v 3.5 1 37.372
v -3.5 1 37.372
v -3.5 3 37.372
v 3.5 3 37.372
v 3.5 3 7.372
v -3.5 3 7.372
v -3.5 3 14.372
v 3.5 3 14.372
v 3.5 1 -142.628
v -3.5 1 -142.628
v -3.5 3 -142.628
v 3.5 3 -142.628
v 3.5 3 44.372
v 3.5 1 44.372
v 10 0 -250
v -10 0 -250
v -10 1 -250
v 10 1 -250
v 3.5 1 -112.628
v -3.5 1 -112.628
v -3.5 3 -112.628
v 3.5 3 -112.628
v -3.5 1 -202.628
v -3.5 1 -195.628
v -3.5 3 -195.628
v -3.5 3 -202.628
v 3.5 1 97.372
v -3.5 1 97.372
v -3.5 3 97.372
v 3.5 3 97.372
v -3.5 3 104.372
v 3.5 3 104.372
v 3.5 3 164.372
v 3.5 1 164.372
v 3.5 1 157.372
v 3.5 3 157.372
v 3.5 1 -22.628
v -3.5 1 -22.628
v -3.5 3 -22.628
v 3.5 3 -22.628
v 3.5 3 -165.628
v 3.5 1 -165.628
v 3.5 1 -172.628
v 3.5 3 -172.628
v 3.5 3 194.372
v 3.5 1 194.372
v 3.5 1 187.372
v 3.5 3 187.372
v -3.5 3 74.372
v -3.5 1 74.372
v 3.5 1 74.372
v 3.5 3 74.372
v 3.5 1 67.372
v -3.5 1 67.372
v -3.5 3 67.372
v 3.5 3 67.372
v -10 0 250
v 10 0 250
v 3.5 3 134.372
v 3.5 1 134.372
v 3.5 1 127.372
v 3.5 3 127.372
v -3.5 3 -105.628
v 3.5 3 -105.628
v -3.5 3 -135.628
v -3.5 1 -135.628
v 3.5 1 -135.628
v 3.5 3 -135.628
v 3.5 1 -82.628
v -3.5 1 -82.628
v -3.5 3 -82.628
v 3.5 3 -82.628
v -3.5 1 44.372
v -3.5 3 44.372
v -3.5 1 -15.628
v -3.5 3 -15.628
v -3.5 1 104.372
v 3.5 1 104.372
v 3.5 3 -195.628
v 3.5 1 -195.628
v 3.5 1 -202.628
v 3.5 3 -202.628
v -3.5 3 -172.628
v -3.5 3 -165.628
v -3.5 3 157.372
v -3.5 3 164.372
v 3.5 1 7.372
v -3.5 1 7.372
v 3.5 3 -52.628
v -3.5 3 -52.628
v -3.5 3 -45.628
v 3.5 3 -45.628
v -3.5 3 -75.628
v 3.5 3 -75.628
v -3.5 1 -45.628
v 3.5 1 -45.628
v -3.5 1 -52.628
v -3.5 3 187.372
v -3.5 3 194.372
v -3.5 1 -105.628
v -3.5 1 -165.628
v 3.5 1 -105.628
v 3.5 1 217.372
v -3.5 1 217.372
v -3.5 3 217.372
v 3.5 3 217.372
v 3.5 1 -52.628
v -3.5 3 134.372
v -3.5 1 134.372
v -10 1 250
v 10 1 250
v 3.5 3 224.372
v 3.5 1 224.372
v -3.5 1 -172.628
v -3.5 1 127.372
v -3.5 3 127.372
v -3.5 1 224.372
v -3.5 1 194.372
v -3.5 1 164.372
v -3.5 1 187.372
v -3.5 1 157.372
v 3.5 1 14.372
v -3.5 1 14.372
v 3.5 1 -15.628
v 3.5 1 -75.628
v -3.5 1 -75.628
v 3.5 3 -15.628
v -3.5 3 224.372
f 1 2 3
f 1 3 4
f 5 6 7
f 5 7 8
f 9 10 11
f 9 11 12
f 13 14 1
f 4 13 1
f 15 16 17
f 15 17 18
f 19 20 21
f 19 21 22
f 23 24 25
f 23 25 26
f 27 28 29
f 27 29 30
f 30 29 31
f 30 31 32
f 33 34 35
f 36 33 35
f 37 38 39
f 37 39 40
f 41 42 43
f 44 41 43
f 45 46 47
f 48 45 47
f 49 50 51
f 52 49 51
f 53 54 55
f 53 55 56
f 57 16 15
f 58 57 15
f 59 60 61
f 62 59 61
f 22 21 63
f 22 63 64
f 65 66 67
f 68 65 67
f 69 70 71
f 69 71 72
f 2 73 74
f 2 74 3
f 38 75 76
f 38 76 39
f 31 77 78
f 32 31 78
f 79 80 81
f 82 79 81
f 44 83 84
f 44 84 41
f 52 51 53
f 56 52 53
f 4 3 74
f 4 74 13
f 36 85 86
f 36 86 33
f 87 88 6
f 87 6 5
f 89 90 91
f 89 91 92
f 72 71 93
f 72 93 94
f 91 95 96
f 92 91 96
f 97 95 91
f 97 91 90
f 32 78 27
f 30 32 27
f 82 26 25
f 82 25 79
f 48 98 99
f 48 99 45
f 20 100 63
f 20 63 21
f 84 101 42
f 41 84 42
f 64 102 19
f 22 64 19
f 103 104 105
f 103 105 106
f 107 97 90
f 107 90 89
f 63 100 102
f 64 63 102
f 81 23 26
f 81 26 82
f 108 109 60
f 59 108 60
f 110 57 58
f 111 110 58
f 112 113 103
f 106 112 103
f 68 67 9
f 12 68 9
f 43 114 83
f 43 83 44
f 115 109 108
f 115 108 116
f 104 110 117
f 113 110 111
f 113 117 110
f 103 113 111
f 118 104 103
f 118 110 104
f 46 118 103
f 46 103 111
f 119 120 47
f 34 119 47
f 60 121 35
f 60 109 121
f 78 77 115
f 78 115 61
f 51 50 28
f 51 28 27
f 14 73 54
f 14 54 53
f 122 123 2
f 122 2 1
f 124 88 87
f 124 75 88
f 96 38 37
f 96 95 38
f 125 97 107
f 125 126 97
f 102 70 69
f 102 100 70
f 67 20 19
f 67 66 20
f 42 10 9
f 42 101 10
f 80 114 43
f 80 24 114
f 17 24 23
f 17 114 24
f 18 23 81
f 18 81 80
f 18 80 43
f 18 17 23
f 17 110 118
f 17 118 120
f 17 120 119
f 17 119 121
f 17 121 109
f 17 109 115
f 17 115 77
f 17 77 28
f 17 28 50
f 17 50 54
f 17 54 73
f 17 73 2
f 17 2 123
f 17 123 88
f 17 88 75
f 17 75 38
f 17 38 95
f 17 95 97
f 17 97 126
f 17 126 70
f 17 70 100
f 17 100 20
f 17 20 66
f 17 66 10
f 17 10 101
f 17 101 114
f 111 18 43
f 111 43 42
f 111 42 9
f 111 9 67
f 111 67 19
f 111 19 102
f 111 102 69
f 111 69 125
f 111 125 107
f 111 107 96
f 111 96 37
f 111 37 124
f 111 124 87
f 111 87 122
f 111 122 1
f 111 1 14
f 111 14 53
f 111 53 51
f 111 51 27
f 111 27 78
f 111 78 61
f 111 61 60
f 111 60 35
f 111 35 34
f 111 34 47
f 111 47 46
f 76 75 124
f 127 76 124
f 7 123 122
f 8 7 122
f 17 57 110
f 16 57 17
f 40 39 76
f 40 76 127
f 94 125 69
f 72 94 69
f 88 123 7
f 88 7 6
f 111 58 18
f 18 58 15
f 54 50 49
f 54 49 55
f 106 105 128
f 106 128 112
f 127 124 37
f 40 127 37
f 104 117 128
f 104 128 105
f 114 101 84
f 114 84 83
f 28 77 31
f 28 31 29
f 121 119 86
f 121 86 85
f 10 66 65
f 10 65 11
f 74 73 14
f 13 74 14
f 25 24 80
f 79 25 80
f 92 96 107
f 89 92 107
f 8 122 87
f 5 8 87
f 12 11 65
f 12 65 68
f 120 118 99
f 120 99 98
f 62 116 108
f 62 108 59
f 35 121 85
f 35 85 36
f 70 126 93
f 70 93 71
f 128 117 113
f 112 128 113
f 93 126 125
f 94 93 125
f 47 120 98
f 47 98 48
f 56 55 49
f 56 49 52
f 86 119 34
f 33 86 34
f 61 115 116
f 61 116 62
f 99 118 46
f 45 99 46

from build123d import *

# Parameters (mm, degrees)
ESQUISSE1_W                    = 20
ESQUISSE1_H                    = 500
BOSS_EXTRU_1_DEPTH             = 1
ESQUISSE2_W                    = 7
ESQUISSE2_H                    = 7
BOSS_EXTRU_2_DEPTH             = 2
R_P_TITION_LIN_AIRE1_COUNT     = 7
R_P_TITION_LIN_AIRE1_PITCH     = 30
R_P_TITION_LIN_AIRE1_COL_COUNT = 9
R_P_TITION_LIN_AIRE1_COL_PITCH = 30


with BuildPart() as part:
    # Esquisse1 → Boss.-Extru.1 (new body)
    with BuildSketch(Plane(origin=(0, 0, 0), x_dir=(1, 0, 0), z_dir=(0, 1, 0))):
        Rectangle(ESQUISSE1_W, ESQUISSE1_H)
    extrude(amount=BOSS_EXTRU_1_DEPTH)

    # Esquisse2 → Boss.-Extru.2 (add)
    with BuildSketch(Plane(origin=(0, 1, 0), x_dir=(1, 0, 0), z_dir=(0, 1, 0))):
        with Locations((0, 19.127958594)):
            Rectangle(ESQUISSE2_W, ESQUISSE2_H)
    boss_extru_2 = extrude(amount=BOSS_EXTRU_2_DEPTH)

    # Répétition linéaire1: Boss.-Extru.2 ×7
    with Locations(*[(0, 0, -i * R_P_TITION_LIN_AIRE1_PITCH) for i in range(1, R_P_TITION_LIN_AIRE1_COUNT)]):
        add(boss_extru_2)

    # Répétition linéaire1 col: Boss.-Extru.2 ×9
    with Locations(*[(0, 0, i * R_P_TITION_LIN_AIRE1_COL_PITCH) for i in range(1, R_P_TITION_LIN_AIRE1_COL_COUNT)]):
        add(boss_extru_2)


solid = part.part
